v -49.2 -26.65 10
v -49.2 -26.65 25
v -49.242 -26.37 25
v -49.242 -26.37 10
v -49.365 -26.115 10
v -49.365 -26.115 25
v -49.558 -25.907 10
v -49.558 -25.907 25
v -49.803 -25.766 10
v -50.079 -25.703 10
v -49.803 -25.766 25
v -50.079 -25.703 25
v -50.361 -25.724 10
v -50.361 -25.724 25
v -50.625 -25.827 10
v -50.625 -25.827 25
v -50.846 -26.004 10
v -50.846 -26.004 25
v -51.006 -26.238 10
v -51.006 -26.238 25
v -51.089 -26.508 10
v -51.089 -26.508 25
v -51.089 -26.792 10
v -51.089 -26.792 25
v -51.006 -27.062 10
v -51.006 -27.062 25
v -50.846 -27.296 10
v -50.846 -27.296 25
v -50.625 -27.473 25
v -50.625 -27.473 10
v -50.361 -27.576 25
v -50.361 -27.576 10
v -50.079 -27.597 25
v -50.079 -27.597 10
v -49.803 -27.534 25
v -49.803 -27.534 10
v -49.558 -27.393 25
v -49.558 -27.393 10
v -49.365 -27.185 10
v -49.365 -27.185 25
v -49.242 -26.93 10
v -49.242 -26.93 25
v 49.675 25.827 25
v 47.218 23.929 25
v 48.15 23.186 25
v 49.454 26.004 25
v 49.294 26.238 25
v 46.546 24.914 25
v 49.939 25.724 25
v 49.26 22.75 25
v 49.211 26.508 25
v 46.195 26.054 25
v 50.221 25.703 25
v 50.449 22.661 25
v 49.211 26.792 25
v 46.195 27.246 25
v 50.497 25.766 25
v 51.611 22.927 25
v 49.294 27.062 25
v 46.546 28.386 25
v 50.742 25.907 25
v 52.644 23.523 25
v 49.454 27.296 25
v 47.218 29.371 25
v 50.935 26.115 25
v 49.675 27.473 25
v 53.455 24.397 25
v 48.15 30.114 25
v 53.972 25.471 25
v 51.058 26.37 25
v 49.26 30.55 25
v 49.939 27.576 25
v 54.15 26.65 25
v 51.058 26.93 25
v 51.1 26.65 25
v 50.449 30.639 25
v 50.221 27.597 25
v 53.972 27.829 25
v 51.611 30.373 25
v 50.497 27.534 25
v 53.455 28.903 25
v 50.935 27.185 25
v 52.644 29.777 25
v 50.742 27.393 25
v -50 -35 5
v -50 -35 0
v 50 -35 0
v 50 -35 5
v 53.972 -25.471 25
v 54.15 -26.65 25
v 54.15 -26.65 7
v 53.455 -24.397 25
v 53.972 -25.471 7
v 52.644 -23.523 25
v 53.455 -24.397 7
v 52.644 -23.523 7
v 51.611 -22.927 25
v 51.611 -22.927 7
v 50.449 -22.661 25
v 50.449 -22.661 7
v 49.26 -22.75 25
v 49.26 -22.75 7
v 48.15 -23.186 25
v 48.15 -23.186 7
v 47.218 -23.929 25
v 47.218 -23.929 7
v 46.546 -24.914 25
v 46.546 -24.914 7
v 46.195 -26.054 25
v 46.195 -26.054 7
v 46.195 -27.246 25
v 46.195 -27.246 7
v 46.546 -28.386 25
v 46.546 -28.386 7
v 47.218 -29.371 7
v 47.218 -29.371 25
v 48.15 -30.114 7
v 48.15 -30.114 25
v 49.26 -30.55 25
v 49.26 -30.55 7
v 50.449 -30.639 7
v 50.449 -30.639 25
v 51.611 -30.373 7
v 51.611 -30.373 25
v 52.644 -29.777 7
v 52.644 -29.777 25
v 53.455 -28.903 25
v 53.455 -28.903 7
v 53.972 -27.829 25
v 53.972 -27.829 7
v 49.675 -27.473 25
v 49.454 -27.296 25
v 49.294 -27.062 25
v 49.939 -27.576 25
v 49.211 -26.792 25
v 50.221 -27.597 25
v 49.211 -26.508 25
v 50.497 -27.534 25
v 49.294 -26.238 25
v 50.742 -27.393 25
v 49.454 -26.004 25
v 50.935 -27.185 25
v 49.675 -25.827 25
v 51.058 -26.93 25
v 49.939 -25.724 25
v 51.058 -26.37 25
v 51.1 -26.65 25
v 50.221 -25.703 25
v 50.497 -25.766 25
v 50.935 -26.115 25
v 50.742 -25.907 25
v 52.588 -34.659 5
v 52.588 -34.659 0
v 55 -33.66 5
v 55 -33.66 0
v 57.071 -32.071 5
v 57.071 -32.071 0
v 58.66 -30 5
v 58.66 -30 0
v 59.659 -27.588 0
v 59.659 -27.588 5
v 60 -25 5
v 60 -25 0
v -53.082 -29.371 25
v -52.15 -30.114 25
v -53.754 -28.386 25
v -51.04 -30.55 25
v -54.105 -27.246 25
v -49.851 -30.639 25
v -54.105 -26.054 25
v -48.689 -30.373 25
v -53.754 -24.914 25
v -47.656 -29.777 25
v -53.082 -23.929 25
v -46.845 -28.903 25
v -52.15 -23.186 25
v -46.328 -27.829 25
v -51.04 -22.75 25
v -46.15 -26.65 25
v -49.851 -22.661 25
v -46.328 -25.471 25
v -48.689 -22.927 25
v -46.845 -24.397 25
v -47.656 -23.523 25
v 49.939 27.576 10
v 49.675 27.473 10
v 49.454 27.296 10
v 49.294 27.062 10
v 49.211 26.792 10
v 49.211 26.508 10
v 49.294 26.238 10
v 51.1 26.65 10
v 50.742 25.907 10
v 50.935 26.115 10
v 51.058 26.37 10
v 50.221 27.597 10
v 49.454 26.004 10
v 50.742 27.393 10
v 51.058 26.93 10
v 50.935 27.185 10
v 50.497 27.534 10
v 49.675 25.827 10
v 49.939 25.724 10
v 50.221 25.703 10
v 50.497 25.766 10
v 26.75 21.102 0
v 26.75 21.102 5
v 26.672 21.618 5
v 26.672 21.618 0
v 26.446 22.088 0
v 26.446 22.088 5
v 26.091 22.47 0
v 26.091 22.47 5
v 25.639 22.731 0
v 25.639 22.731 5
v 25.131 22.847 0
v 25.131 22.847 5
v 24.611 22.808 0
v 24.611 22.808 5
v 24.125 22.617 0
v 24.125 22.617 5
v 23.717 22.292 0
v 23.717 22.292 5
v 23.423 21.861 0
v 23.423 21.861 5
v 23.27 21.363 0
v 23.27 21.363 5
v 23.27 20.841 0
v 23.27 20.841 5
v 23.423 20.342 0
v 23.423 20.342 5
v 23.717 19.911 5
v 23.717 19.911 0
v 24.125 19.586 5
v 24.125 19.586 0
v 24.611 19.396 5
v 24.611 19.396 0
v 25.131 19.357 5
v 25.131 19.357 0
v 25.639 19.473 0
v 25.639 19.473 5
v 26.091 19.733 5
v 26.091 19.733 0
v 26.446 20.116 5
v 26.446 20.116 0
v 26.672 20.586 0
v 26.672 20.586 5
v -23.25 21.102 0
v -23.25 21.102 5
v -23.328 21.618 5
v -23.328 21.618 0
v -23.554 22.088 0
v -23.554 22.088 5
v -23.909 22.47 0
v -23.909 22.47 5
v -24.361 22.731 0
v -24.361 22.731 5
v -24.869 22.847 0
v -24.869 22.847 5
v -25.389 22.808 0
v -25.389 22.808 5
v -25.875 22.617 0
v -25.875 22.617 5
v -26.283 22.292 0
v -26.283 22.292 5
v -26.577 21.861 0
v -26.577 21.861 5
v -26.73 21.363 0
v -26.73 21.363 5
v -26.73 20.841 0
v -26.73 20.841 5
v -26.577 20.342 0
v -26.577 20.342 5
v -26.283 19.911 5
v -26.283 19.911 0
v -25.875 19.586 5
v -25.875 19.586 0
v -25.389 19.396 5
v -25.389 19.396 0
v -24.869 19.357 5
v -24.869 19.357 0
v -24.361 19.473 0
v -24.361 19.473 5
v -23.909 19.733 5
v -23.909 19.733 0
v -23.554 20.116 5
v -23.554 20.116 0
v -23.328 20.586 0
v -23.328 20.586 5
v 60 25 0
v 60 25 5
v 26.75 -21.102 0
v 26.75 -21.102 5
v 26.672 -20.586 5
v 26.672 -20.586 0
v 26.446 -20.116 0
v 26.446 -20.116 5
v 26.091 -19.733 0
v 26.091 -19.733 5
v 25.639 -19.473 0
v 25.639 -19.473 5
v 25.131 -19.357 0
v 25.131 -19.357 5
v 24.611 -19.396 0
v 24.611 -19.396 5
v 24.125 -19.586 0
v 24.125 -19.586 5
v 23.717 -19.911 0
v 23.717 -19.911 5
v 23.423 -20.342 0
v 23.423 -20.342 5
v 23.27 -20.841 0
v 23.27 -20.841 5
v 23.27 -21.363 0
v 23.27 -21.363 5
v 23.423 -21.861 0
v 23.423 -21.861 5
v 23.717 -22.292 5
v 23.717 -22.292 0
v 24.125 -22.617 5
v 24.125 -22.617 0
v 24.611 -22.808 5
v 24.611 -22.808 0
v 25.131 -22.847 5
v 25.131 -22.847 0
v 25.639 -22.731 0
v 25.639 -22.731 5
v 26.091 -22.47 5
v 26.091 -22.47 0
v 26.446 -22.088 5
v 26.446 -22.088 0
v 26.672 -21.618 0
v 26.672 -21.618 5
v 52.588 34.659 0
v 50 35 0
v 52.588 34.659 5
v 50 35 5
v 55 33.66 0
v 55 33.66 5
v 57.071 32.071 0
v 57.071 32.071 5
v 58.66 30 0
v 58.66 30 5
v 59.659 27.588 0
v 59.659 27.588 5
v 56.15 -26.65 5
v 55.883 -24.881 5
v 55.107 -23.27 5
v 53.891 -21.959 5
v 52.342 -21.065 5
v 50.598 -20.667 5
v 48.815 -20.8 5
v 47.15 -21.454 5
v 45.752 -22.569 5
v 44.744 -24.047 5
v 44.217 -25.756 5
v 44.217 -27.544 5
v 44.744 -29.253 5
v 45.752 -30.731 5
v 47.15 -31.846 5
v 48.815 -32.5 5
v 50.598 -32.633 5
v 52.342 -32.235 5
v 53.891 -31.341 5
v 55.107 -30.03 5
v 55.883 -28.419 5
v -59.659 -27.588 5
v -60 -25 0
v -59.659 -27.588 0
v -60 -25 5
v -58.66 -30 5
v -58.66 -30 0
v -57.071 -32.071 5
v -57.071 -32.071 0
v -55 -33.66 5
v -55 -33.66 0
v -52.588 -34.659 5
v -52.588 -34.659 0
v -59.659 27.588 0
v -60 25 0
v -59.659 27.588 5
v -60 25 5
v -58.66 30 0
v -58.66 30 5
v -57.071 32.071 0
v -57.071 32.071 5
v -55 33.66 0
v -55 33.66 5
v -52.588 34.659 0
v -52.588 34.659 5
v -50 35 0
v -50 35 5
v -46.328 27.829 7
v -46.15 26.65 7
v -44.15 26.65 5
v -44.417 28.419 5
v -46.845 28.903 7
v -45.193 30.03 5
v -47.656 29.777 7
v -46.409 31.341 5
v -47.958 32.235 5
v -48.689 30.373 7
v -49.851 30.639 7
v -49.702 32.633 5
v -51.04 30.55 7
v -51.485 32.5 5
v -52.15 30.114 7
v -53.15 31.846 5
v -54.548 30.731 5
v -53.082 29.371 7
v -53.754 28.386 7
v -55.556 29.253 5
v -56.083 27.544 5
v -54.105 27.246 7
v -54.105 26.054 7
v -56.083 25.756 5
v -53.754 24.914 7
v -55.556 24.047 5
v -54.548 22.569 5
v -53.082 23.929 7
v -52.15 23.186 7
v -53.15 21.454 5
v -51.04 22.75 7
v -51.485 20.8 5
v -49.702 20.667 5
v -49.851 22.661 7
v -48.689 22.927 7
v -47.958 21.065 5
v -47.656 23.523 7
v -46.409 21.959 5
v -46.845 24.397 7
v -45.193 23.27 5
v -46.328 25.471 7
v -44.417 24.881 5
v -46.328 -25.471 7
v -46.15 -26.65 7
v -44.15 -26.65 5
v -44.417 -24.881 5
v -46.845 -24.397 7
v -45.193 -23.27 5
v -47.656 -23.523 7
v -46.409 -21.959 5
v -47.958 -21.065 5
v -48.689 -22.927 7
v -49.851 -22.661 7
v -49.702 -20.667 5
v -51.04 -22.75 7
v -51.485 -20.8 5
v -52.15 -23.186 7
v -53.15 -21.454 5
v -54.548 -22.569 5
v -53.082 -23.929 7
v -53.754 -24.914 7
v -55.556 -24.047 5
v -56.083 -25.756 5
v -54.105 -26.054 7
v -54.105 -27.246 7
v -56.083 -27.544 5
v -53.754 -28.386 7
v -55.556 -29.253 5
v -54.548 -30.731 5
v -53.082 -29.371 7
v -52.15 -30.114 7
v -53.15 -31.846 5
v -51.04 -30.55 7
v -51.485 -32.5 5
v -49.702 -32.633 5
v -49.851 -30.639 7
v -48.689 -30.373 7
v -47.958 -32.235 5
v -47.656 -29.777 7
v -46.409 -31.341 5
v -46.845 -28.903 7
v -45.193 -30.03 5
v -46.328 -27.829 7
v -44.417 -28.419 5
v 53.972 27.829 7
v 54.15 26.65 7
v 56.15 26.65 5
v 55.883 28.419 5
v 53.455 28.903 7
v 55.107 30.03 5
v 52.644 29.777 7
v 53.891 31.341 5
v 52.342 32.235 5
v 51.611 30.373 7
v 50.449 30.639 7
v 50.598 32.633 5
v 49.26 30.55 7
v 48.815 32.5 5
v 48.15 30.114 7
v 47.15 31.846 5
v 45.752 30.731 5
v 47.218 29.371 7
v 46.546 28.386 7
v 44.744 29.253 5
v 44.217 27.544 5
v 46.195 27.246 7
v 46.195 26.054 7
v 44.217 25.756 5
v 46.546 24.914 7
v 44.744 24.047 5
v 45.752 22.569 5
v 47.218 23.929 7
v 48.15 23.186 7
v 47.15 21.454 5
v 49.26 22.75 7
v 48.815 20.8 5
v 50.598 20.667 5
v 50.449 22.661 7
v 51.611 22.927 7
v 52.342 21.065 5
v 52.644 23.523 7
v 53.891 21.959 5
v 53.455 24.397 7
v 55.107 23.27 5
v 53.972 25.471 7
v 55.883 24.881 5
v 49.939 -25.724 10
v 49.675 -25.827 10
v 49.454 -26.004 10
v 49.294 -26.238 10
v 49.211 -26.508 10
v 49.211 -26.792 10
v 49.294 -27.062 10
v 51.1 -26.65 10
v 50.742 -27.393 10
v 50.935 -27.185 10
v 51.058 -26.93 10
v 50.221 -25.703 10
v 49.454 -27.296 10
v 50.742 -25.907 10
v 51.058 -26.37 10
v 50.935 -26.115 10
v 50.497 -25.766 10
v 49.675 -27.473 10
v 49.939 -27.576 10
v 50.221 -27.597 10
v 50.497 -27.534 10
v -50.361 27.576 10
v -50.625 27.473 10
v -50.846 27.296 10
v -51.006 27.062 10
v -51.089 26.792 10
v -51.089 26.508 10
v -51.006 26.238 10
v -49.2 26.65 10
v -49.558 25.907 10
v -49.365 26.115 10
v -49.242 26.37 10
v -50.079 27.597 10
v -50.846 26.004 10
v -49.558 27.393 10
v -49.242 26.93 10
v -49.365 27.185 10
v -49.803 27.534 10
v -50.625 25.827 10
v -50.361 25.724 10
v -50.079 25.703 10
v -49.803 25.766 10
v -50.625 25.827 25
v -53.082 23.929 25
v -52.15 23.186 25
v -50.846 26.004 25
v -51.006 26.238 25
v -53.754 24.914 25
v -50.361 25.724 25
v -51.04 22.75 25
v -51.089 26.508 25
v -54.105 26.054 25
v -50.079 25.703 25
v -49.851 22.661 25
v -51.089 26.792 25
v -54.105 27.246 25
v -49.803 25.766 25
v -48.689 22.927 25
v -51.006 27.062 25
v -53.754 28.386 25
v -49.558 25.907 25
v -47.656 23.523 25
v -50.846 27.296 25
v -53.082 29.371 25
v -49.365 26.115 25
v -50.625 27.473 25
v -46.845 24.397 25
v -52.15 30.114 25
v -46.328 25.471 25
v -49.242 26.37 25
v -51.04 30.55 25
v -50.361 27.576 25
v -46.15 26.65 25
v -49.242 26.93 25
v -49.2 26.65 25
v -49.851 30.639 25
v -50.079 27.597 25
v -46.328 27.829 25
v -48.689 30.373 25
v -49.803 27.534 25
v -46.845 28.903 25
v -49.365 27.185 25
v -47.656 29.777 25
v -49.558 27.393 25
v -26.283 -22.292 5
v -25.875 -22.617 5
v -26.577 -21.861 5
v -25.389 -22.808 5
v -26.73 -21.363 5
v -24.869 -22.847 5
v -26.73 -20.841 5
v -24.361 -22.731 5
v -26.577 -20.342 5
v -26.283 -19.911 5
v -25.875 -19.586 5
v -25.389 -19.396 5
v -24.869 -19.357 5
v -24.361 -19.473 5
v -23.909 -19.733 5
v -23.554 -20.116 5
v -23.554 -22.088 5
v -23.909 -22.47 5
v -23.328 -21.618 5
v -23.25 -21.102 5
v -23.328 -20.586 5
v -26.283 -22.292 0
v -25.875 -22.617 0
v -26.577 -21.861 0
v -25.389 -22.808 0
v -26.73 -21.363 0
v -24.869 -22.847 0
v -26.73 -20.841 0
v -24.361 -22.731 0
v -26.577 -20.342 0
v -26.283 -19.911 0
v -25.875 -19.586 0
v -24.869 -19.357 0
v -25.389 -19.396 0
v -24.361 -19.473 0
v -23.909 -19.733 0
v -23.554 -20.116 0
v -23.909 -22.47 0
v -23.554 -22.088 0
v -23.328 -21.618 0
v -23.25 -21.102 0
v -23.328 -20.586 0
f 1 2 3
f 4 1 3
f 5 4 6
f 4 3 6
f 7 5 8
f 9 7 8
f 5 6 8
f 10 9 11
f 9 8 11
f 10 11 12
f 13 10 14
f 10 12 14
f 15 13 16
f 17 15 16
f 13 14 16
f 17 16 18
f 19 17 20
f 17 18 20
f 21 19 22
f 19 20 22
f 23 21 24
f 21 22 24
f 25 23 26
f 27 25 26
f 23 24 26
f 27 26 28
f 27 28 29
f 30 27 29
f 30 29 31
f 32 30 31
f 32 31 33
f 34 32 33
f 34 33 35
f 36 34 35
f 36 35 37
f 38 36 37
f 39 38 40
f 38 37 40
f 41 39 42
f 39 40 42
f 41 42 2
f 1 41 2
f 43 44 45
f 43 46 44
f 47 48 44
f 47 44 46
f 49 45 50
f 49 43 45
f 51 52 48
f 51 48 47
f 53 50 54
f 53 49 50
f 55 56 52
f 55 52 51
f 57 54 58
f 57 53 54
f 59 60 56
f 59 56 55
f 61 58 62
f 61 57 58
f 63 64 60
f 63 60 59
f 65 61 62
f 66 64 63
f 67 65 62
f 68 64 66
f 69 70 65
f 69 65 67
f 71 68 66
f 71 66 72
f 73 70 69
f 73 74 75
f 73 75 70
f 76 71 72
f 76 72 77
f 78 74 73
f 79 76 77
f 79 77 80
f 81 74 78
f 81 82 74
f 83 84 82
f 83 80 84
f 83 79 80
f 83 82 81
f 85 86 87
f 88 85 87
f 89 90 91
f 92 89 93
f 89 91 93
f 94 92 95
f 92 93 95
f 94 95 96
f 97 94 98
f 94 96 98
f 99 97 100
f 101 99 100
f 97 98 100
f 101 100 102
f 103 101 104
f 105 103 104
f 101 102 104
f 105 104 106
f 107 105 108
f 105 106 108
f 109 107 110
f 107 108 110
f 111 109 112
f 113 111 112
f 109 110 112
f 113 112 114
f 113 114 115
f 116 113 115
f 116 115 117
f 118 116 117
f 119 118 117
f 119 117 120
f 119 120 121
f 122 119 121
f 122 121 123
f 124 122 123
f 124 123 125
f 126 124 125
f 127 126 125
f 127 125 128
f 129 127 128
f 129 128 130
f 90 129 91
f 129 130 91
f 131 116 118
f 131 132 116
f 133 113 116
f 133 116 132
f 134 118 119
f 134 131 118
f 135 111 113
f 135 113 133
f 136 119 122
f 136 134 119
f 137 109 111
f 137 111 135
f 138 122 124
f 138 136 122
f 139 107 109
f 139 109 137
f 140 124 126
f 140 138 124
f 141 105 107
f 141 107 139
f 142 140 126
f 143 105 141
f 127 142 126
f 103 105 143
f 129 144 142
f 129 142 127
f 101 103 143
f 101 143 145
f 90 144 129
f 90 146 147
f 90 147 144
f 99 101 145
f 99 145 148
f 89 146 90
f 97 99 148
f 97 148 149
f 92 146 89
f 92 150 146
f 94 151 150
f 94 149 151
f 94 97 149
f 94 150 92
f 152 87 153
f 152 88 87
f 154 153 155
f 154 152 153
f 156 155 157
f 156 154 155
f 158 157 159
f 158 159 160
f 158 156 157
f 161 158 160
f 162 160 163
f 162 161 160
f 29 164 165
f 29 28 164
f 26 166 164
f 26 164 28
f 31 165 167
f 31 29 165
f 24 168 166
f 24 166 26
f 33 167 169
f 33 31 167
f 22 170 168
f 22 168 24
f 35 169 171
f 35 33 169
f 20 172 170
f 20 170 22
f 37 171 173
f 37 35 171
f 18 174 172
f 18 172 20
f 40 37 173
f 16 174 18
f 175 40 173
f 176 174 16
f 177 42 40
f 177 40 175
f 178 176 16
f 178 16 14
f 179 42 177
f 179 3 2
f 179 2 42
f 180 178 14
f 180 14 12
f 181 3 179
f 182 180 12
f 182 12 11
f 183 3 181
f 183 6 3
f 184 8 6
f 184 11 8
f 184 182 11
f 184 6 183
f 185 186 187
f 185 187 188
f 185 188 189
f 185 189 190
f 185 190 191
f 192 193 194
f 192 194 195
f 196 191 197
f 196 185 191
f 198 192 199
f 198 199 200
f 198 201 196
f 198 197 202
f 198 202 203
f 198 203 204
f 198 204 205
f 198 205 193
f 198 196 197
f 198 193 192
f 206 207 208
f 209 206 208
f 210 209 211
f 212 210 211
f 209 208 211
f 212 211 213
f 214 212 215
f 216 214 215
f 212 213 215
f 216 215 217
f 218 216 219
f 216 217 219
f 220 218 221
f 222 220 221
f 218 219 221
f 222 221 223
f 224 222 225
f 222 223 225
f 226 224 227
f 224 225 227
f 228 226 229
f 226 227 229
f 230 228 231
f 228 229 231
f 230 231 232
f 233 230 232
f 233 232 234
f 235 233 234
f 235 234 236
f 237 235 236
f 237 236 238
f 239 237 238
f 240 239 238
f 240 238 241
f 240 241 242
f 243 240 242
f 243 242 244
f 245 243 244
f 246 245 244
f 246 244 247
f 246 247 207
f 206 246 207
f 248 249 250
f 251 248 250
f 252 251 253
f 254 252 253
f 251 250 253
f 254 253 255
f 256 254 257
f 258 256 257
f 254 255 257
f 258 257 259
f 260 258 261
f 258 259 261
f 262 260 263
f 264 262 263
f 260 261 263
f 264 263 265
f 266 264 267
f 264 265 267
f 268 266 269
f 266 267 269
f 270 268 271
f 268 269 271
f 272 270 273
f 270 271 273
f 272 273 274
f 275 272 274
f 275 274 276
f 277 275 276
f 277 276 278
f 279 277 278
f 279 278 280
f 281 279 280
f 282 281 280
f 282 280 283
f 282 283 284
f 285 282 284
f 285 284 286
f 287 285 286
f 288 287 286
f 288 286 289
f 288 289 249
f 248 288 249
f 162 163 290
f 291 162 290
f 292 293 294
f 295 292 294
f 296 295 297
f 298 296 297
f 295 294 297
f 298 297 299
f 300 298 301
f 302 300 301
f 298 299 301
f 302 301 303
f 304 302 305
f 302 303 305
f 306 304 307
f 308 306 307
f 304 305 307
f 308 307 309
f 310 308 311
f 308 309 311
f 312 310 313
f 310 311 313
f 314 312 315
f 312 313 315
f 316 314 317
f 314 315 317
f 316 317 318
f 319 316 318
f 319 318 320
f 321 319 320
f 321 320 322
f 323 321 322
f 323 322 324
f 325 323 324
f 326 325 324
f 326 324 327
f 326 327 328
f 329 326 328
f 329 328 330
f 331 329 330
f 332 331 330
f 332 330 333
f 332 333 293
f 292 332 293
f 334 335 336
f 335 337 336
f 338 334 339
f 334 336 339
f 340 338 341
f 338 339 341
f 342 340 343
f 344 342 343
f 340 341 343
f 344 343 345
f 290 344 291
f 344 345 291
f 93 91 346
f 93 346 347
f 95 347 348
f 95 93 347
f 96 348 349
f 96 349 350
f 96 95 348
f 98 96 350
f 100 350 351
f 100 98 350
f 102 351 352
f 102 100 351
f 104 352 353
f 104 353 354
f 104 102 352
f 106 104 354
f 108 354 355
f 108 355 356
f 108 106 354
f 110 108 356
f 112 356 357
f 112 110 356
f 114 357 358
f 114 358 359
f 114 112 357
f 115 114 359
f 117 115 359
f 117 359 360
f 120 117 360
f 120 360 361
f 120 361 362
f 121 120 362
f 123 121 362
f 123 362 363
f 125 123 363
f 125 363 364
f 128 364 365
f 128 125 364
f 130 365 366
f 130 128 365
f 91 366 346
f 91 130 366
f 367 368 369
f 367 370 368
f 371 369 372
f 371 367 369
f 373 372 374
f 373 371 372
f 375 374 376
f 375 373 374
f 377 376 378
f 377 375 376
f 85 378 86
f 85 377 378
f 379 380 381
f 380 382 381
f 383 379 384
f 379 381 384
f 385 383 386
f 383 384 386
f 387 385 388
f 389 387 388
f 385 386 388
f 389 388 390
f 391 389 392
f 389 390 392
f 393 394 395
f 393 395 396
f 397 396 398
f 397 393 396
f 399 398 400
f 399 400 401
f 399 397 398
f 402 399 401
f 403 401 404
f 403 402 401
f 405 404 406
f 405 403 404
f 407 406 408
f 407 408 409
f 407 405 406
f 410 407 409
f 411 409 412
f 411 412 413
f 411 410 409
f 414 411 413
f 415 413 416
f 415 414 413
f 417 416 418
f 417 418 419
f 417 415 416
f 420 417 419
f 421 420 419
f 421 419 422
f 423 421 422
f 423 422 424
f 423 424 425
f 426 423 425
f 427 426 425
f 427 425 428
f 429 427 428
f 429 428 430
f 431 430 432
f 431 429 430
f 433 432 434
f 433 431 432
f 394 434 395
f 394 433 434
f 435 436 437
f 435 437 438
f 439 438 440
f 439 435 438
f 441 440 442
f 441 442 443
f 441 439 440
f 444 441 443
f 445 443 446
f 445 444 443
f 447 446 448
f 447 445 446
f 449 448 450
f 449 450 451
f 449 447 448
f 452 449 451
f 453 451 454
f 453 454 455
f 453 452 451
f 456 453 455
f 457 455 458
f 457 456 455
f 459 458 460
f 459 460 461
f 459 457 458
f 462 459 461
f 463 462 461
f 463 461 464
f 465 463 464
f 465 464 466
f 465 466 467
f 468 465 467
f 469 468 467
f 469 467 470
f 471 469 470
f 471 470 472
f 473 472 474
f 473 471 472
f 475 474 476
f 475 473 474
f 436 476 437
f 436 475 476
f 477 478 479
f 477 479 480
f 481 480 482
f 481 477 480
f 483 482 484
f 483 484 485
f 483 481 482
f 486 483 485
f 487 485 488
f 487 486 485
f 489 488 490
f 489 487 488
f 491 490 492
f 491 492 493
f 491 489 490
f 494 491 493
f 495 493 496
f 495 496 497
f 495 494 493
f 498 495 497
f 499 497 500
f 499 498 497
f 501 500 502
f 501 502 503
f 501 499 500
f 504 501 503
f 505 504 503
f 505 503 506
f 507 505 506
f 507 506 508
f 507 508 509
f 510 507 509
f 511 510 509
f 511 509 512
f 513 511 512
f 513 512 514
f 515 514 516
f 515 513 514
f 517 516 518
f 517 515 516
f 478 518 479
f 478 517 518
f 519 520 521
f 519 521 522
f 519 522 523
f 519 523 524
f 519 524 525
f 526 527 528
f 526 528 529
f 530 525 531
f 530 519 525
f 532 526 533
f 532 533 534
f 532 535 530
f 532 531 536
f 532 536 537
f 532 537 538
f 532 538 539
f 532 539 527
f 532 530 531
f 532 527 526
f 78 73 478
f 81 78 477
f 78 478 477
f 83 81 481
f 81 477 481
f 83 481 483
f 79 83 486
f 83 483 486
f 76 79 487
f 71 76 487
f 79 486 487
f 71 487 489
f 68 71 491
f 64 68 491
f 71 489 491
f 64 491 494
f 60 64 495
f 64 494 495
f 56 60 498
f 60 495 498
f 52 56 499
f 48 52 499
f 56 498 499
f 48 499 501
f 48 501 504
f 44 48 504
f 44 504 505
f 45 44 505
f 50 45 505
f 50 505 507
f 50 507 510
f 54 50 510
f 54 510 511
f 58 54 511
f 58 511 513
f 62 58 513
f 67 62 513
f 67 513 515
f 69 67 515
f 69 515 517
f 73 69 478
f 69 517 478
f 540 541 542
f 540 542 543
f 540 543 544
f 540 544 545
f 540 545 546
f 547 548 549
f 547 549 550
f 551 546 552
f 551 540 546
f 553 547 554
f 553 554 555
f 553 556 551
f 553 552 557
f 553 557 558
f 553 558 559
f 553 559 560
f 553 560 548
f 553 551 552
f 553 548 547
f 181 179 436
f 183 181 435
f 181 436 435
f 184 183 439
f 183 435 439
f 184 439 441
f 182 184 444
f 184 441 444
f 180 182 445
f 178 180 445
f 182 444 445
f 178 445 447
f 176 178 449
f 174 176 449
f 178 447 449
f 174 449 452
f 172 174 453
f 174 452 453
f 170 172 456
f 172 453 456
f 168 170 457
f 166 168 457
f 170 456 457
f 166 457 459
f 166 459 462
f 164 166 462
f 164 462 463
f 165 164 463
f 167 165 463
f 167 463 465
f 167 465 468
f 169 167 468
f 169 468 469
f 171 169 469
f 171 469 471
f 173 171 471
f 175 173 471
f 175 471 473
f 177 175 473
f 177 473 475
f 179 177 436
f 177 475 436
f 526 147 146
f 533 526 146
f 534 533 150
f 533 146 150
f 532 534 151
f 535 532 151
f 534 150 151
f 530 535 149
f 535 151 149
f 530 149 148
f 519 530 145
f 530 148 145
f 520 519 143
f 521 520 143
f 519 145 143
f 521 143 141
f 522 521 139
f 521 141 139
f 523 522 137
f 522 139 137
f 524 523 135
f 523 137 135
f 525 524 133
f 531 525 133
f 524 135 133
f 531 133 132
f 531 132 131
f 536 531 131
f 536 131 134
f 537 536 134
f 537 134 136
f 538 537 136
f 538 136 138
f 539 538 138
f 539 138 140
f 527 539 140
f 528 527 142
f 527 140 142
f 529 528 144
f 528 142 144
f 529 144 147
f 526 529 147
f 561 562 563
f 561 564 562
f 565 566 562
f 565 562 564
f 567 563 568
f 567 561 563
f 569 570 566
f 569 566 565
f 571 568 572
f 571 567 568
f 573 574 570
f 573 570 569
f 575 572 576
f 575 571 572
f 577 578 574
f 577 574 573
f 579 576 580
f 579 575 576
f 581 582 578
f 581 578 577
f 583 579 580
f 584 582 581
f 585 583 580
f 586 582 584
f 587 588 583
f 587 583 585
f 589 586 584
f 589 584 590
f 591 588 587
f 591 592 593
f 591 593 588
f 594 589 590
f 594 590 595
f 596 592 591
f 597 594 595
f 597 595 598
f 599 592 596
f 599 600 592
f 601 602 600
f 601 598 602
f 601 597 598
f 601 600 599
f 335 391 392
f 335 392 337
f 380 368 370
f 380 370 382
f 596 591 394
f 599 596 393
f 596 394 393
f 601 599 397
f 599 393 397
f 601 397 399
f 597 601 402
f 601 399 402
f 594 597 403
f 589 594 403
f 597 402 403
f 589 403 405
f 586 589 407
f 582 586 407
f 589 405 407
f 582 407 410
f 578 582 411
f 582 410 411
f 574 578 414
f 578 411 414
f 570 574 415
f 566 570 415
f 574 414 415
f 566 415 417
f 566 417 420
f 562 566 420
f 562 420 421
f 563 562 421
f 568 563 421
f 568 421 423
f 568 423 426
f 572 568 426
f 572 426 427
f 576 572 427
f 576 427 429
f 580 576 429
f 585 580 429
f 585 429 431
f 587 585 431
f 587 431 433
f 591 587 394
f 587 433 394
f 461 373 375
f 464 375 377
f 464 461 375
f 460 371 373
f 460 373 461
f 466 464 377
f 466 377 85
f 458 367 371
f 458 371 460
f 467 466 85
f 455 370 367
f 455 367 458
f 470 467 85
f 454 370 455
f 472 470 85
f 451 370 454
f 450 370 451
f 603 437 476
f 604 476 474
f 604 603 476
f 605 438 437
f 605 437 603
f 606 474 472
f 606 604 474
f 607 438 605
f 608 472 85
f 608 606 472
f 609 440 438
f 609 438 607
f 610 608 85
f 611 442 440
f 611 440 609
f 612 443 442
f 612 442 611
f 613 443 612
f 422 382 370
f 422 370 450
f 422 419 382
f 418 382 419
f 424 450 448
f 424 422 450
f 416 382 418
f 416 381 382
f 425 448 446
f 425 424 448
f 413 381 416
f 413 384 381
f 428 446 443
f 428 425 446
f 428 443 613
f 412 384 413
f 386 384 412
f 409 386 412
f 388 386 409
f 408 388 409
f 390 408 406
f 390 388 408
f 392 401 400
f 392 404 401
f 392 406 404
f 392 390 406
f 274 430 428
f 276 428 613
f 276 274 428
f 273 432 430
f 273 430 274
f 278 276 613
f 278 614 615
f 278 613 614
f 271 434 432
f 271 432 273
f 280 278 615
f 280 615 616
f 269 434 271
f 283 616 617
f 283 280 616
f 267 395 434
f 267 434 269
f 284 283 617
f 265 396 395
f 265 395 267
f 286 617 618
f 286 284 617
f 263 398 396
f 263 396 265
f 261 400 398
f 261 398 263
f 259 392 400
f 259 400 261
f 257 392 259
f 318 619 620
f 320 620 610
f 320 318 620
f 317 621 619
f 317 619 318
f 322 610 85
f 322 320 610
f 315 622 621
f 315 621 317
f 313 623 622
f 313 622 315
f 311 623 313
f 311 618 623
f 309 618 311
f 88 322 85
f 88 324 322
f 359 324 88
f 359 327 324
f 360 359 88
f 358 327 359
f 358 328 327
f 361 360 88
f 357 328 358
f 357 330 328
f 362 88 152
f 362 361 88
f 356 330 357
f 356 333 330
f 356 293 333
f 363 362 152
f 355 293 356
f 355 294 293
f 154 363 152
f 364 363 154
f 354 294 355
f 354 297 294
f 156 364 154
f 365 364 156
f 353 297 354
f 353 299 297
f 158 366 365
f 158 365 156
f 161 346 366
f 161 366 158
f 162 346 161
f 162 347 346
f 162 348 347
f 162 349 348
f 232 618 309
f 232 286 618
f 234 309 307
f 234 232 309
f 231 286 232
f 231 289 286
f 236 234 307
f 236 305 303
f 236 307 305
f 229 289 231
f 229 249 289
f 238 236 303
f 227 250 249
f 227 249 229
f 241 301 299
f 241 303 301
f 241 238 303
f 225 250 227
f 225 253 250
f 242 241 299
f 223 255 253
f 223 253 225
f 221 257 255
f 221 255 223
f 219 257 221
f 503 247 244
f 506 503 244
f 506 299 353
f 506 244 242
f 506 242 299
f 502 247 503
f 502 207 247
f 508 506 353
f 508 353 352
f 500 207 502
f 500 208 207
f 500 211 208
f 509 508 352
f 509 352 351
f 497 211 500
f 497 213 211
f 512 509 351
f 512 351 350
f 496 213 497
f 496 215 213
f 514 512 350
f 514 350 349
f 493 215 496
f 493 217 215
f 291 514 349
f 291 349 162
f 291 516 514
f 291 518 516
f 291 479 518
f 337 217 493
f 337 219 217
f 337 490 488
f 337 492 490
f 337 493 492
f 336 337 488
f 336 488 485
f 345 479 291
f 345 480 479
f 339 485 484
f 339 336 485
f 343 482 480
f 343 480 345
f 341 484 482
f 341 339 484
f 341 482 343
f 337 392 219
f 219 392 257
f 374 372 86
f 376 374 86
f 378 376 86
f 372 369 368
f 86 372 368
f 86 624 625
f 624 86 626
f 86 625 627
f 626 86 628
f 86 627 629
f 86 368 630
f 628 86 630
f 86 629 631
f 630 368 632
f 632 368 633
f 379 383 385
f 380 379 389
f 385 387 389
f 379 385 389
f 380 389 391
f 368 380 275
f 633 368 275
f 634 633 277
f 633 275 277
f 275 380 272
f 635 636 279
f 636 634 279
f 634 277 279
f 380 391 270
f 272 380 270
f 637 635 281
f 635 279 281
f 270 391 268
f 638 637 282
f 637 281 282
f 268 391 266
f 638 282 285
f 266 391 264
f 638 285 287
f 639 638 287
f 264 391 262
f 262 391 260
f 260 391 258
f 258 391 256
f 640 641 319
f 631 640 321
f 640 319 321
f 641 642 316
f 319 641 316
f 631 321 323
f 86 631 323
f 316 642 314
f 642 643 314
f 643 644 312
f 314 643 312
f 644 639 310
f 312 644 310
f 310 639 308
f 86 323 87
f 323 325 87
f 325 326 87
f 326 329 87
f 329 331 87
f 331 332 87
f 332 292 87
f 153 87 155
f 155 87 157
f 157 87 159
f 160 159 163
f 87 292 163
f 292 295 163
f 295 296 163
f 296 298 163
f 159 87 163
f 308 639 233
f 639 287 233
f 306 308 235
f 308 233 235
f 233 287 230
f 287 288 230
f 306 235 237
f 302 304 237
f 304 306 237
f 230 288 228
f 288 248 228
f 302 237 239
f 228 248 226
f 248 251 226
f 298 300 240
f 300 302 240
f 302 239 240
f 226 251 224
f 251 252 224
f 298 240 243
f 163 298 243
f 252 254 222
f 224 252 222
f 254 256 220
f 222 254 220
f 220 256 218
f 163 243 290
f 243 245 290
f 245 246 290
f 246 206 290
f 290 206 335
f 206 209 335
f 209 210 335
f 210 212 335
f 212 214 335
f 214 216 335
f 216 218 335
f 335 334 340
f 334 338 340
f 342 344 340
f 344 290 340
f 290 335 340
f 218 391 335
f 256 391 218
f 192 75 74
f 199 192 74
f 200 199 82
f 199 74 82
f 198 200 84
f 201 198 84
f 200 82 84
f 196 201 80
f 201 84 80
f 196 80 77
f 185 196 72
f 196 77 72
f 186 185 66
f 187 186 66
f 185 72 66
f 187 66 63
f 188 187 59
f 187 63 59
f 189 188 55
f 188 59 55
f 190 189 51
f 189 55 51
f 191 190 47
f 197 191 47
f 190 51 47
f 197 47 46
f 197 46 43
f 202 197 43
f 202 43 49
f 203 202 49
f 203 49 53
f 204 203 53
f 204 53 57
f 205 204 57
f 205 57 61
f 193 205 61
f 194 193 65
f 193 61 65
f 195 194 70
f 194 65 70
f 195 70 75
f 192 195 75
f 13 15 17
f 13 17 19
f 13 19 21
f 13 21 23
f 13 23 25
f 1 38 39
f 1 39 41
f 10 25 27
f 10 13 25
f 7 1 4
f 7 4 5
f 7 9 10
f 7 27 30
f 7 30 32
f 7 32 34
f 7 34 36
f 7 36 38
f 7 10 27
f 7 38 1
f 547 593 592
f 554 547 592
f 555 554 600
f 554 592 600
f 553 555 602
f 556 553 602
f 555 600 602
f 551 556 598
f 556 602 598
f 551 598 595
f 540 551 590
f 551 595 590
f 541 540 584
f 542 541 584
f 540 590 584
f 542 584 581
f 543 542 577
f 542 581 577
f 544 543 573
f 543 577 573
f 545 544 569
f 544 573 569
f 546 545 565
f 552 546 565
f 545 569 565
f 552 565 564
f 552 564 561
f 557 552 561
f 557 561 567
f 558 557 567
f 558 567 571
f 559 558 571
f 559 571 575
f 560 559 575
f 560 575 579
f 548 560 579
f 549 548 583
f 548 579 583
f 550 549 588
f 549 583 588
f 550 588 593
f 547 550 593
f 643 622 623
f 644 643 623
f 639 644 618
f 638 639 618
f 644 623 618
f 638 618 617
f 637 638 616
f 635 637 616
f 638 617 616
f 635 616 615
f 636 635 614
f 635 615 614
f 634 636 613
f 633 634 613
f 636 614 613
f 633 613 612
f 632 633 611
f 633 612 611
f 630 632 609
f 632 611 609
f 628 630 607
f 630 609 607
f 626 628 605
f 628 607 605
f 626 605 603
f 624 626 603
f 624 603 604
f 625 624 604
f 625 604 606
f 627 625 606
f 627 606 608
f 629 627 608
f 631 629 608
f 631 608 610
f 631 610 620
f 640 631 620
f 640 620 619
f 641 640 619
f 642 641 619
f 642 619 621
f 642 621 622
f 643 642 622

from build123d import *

# Parameters (mm, degrees)
SCHIZZO1_W                   = 120
SCHIZZO1_H                   = 70
ESTRUSIONE_ESTRUSIONE1_DEPTH = 5
SCHIZZO2_R                   = 4
ESTRUSIONE_ESTRUSIONE2_DEPTH = 20
SMUSSO1_SIZE                 = 2
SCHIZZO3_R                   = 0.95
TAGLIO_ESTRUSIONE1_DEPTH     = 15
RACCORDO1_R                  = 10
SCHIZZO4_R                   = 1.75
TAGLIO_ESTRUSIONE2_DEPTH     = 10


with BuildPart() as part:
    # Schizzo1 → Estrusione-Estrusione1 (new body)
    with BuildSketch(Plane.XY):
        Rectangle(SCHIZZO1_W, SCHIZZO1_H)
    extrude(amount=ESTRUSIONE_ESTRUSIONE1_DEPTH)

    # Schizzo2 → Estrusione-Estrusione2 (add)
    with BuildSketch(Plane.XY.offset(5)):
        with Locations((-50.15, 26.65)):
            Circle(SCHIZZO2_R)
        with Locations((50.15, -26.65)):
            Circle(SCHIZZO2_R)
        with Locations((50.15, 26.65)):
            Circle(SCHIZZO2_R)
        with Locations((-50.15, -26.65)):
            Circle(SCHIZZO2_R)
    extrude(amount=ESTRUSIONE_ESTRUSIONE2_DEPTH)

    # Smusso1
    smusso1_edges = [part.edges().sort_by_distance(p)[0] for p in [
        (-54.15, 26.65, 5),
        (46.15, -26.65, 5),
        (46.15, 26.65, 5),
        (-54.15, -26.65, 5),
    ]]
    chamfer(smusso1_edges, length=SMUSSO1_SIZE)

    # Schizzo3 → Taglio-Estrusione1 (cut)
    with BuildSketch(Plane.XY.offset(25)):
        with Locations((-50.15, 26.65)):
            Circle(SCHIZZO3_R)
        with Locations((50.15, 26.65)):
            Circle(SCHIZZO3_R)
        with Locations((50.15, -26.65)):
            Circle(SCHIZZO3_R)
        with Locations((-50.15, -26.65)):
            Circle(SCHIZZO3_R)
    extrude(amount=-TAGLIO_ESTRUSIONE1_DEPTH, mode=Mode.SUBTRACT)

    # Raccordo1
    raccordo1_edges = [part.edges().sort_by_distance(p)[0] for p in [
        (-60, 35, 2.5),
        (60, 35, 2.5),
        (60, -35, 2.5),
        (-60, -35, 2.5),
    ]]
    fillet(raccordo1_edges, radius=RACCORDO1_R)

    # Schizzo4 → Taglio-Estrusione2 (cut)
    with BuildSketch(Plane.XY.offset(5)):
        with Locations((-25, 21.101703565)):
            Circle(SCHIZZO4_R)
        with Locations((25, 21.101703565)):
            Circle(SCHIZZO4_R)
        with Locations((25, -21.101703565)):
            Circle(SCHIZZO4_R)
        with Locations((-25, -21.101703565)):
            Circle(SCHIZZO4_R)
    extrude(amount=-TAGLIO_ESTRUSIONE2_DEPTH, mode=Mode.SUBTRACT)


solid = part.part
